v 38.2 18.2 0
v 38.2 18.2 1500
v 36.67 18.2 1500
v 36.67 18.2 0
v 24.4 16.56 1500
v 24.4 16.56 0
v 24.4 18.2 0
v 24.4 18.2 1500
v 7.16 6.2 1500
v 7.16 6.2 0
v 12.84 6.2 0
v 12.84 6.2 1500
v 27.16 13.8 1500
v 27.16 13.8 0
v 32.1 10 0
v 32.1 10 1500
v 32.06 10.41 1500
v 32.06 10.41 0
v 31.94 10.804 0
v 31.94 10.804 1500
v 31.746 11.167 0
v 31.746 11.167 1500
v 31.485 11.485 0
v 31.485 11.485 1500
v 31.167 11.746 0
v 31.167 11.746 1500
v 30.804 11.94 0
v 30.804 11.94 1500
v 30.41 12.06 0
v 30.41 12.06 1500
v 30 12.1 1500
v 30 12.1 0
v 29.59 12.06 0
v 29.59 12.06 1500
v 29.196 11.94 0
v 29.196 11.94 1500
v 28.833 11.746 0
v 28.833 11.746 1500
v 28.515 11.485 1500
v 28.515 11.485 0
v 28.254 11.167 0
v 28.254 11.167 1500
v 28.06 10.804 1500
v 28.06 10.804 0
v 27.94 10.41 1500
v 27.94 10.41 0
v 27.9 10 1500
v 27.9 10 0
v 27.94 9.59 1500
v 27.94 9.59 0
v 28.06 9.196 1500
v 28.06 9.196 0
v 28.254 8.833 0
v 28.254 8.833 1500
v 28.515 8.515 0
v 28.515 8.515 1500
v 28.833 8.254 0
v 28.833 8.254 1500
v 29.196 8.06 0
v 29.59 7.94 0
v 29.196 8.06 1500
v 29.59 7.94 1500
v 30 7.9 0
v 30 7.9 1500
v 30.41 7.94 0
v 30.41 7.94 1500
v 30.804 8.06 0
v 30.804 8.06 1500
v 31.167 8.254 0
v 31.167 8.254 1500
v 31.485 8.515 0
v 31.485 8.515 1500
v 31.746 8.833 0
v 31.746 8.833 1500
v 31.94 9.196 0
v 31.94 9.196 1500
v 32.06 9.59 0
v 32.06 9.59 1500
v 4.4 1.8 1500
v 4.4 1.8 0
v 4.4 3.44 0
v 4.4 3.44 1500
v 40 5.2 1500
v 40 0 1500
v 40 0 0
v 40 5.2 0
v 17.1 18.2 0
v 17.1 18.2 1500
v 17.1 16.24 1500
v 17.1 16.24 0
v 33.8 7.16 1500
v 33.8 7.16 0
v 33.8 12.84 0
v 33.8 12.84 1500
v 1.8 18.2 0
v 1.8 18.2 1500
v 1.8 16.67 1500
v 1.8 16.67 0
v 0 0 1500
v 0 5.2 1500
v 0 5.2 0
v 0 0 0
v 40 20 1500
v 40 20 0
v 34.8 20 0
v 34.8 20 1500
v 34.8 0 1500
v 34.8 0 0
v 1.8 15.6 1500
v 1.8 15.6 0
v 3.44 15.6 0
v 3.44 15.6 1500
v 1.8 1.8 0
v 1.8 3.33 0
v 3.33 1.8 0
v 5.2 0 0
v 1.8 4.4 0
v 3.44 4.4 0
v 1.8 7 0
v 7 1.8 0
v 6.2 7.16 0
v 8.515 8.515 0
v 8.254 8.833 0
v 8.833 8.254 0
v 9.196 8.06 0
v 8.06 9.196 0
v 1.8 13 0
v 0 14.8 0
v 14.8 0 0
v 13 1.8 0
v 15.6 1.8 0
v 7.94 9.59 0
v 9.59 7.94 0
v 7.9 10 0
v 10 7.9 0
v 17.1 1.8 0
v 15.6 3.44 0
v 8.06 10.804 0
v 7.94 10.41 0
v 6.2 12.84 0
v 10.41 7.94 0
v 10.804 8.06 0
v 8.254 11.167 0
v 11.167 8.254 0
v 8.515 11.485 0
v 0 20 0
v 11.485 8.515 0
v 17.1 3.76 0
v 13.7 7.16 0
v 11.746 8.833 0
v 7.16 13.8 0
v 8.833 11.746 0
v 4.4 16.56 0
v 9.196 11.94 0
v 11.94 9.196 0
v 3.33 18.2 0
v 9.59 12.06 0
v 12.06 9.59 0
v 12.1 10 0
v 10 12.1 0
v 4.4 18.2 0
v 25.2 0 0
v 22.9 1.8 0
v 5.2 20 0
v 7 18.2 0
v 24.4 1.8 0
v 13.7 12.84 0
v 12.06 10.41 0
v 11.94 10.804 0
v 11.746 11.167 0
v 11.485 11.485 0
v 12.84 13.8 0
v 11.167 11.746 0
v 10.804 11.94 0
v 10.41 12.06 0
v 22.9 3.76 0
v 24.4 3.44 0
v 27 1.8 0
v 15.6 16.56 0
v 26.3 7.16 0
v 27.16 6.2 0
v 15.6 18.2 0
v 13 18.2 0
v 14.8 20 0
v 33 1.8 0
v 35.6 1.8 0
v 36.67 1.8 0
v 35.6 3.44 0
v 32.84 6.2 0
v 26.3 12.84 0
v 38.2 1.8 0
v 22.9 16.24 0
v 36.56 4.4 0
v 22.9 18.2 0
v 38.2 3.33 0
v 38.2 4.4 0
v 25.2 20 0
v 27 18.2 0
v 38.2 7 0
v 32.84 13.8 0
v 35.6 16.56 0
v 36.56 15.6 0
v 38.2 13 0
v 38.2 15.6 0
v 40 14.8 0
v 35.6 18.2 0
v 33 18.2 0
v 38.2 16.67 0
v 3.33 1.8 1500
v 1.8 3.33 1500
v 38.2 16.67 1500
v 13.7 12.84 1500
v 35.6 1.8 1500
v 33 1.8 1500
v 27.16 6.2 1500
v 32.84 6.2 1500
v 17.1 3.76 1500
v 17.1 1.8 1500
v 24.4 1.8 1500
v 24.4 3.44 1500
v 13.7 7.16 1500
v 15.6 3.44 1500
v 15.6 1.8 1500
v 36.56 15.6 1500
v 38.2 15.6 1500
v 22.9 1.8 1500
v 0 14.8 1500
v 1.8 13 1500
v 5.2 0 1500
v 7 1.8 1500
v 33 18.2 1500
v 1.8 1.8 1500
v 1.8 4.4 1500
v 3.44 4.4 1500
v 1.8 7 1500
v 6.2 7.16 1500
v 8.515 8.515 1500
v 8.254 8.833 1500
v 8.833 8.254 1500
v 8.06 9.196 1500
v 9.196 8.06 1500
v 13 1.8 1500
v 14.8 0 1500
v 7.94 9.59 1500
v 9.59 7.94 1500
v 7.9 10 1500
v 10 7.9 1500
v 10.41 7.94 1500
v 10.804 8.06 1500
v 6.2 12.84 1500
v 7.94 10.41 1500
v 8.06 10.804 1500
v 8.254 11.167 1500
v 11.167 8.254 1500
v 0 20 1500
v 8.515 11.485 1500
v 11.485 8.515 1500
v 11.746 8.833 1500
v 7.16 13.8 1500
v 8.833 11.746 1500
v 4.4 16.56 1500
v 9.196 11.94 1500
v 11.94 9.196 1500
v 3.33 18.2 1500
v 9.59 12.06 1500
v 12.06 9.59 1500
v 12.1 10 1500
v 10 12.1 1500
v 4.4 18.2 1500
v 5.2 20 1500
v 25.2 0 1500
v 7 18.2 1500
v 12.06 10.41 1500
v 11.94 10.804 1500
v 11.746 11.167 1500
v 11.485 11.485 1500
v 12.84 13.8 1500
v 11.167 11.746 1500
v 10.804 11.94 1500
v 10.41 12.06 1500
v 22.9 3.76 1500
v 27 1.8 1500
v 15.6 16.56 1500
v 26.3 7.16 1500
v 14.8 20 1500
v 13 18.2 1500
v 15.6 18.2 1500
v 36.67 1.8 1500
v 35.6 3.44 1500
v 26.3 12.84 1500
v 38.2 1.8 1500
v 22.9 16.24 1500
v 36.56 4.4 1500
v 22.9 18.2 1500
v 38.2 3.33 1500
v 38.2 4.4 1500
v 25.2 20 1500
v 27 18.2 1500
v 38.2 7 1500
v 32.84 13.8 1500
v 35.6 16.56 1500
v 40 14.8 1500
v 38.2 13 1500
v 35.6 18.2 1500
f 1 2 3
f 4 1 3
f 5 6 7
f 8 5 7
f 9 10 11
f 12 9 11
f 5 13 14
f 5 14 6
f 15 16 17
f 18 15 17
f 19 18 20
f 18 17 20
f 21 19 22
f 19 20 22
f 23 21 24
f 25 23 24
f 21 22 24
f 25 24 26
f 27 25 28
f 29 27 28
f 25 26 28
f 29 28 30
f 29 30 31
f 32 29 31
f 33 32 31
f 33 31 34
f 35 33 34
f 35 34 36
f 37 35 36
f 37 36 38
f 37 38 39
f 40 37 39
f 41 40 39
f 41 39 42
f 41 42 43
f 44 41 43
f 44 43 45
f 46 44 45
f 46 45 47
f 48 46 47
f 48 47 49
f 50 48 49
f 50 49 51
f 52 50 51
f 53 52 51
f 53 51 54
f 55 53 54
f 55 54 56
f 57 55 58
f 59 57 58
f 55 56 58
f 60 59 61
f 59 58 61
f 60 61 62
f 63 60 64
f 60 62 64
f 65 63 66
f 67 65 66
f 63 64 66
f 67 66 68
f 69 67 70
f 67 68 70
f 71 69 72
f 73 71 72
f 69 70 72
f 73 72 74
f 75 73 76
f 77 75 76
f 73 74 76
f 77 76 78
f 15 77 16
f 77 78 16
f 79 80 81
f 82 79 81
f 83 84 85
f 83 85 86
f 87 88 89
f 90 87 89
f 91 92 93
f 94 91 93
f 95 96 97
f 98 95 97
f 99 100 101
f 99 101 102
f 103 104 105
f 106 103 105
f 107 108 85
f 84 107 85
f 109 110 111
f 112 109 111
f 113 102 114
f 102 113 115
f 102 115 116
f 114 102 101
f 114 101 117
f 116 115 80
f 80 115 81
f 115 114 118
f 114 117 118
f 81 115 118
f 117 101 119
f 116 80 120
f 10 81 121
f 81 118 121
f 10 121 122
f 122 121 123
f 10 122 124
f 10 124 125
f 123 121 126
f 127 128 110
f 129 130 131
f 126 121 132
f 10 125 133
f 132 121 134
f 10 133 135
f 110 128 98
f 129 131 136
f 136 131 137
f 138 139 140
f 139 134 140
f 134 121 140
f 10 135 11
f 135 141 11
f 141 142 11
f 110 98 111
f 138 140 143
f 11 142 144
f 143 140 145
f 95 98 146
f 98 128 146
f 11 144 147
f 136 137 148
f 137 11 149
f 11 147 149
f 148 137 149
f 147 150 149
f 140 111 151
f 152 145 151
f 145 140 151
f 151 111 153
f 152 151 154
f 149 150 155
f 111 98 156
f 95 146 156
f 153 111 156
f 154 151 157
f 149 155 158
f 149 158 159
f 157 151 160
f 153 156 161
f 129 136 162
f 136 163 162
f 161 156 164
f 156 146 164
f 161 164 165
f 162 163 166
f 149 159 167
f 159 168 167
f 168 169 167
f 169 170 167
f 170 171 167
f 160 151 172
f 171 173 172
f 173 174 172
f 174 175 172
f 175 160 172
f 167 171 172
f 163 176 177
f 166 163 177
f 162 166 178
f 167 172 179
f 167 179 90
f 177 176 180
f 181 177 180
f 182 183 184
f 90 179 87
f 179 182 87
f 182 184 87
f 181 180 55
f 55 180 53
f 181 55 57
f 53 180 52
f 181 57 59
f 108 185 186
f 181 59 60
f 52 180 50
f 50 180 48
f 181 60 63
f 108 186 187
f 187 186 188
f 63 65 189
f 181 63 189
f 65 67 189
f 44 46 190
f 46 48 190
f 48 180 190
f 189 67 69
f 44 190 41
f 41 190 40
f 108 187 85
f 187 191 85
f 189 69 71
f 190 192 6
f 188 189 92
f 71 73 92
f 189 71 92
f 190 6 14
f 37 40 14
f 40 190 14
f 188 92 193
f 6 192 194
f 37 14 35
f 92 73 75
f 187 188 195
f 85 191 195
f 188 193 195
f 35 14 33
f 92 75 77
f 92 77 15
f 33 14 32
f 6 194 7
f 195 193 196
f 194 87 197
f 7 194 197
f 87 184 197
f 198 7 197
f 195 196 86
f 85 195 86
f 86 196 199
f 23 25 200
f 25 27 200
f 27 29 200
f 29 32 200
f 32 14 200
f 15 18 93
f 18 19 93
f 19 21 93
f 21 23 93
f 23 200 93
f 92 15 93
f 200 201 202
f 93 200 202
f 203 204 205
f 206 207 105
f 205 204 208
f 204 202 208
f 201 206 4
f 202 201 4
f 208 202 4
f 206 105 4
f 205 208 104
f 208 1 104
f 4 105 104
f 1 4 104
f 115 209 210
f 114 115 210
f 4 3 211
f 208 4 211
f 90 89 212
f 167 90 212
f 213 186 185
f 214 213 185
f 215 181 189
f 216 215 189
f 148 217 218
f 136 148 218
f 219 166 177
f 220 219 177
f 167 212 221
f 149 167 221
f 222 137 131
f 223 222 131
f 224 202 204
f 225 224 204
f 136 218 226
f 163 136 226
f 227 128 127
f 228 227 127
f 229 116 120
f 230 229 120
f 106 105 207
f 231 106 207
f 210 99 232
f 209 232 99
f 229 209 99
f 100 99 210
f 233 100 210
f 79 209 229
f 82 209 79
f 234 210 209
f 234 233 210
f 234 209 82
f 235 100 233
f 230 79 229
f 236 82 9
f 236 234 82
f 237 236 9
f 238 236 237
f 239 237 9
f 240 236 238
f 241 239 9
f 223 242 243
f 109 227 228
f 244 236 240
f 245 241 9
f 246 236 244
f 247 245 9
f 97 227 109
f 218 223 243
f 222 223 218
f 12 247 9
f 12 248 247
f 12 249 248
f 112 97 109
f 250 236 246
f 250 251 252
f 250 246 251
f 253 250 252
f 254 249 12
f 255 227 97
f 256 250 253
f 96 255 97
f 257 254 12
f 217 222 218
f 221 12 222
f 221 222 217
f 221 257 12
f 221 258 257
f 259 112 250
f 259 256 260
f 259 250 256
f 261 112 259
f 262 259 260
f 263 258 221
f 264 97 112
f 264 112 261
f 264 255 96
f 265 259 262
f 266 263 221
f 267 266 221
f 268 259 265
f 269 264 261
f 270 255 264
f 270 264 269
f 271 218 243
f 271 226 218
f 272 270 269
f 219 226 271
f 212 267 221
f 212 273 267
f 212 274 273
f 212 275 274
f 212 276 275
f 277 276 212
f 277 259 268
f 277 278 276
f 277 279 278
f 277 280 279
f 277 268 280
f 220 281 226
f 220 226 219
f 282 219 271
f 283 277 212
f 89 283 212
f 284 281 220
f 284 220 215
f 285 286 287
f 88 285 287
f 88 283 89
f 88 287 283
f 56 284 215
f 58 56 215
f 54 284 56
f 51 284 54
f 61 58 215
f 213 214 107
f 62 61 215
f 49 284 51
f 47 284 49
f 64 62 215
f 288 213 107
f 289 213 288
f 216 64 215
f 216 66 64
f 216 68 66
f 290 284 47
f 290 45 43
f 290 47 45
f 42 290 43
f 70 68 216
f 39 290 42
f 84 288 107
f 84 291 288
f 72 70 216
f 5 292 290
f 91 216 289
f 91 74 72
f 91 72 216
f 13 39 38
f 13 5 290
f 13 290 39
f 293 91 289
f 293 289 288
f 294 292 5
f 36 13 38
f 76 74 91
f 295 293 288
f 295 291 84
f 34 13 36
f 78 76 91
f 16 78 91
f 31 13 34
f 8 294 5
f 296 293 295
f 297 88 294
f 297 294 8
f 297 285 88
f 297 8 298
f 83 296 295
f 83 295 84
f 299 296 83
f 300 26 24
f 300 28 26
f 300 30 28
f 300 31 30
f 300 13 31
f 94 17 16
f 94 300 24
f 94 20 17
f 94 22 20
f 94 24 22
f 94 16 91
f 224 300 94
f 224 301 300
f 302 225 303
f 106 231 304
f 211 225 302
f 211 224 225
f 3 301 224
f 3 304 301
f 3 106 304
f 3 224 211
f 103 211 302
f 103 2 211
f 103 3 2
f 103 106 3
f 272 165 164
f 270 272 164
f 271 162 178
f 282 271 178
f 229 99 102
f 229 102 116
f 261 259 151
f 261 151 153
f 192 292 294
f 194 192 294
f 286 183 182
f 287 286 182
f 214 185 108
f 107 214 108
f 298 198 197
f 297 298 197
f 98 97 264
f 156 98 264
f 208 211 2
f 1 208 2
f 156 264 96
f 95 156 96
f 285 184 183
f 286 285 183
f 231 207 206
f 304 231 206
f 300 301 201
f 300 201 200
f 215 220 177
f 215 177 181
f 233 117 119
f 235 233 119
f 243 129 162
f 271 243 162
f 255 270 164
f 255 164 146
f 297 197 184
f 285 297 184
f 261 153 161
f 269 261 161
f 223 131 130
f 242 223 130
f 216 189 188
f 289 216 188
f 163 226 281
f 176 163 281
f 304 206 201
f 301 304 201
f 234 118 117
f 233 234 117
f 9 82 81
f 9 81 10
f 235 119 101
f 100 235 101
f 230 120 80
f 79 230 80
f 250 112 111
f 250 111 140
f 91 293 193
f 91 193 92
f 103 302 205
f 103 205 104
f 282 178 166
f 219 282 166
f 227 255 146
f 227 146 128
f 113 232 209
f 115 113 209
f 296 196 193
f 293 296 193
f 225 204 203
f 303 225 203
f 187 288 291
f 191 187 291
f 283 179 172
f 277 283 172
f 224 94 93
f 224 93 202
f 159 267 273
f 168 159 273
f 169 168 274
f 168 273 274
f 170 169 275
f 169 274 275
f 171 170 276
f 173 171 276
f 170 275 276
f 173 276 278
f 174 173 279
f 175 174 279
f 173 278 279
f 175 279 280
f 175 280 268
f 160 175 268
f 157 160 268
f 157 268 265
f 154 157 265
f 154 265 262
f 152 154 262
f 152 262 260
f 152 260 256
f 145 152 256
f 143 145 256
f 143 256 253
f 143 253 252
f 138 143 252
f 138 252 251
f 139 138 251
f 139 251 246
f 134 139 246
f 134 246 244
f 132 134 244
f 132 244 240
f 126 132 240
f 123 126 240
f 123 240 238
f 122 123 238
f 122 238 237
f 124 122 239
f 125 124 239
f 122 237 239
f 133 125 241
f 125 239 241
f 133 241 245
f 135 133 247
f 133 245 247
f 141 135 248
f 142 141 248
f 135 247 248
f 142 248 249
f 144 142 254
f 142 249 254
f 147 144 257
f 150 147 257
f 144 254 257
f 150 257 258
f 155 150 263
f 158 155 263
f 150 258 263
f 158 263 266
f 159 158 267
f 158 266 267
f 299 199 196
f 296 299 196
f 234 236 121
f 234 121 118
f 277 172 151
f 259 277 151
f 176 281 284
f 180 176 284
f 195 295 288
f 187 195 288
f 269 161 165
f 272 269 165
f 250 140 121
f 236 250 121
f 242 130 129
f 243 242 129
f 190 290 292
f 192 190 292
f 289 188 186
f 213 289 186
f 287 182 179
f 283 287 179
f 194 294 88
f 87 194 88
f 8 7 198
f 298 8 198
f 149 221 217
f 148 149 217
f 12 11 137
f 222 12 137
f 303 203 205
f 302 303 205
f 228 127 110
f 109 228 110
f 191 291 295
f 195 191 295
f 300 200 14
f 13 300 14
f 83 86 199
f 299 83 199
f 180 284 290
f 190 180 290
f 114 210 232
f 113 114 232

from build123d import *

# Parameters (mm, degrees)
F1_DEPTH = 1500
F3_DEPTH = 1500.001
F4_R     = 2.1
F5_DEPTH = 1500.001


with BuildPart() as f1:
    # F0 (on Top) → F1 (new body)
    with BuildSketch(Plane.XY):
        Polygon((0, 5.2), (0, 0), (5.2, 0), (7, 1.8), (4.4, 1.8), (4.4, 3.44), (7.16, 6.2), (12.84, 6.2), (15.6, 3.44), (15.6, 1.8), (13, 1.8), (14.8, 0), (25.2, 0), (27, 1.8), (24.4, 1.8), (24.4, 3.44), (27.16, 6.2), (32.84, 6.2), (35.6, 3.44), (35.6, 1.8), (33, 1.8), (34.8, 0), (40, 0), (40, 5.2), (38.2, 7), (38.2, 4.4), (36.56, 4.4), (33.8, 7.16), (33.8, 12.84), (36.56, 15.6), (38.2, 15.6), (38.2, 13), (40, 14.8), (40, 20), (34.8, 20), (33, 18.2), (35.6, 18.2), (35.6, 16.56), (32.84, 13.8), (27.16, 13.8), (24.4, 16.56), (24.4, 18.2), (27, 18.2), (25.2, 20), (14.8, 20), (13, 18.2), (15.6, 18.2), (15.6, 16.56), (12.84, 13.8), (7.16, 13.8), (4.4, 16.56), (4.4, 18.2), (7, 18.2), (5.2, 20), (0, 20), (0, 14.8), (1.8, 13), (1.8, 15.6), (3.44, 15.6), (6.2, 12.84), (6.2, 7.16), (3.44, 4.4), (1.8, 4.4), (1.8, 7), align=None)
    extrude(amount=F1_DEPTH)

    # F2 (on face) → F3 (cut, through all)
    with BuildSketch(Plane.XY.offset(1500)):
        Polygon((3.33, 18.2), (1.8, 18.2), (1.8, 16.67), align=None)
        Polygon((1.8, 3.33), (1.8, 1.8), (3.33, 1.8), align=None)
        Polygon((36.67, 1.8), (38.2, 1.8), (38.2, 3.33), align=None)
        Polygon((38.2, 16.67), (38.2, 18.2), (36.67, 18.2), align=None)
    extrude(amount=-F3_DEPTH, mode=Mode.SUBTRACT)

    # F4 (on face) → F5 (cut, through all)
    with BuildSketch(Plane.XY.offset(1500)):
        Polygon((22.9, 18.2), (17.1, 18.2), (17.1, 16.24), (13.7, 12.84), (13.7, 7.16), (17.1, 3.76), (17.1, 1.8), (22.9, 1.8), (22.9, 3.76), (26.3, 7.16), (26.3, 12.84), (22.9, 16.24), align=None)
        with Locations((30, 10)):
            Circle(F4_R)
        with Locations((10, 10)):
            Circle(F4_R)
    extrude(amount=-F5_DEPTH, mode=Mode.SUBTRACT)


solid = f1.part
